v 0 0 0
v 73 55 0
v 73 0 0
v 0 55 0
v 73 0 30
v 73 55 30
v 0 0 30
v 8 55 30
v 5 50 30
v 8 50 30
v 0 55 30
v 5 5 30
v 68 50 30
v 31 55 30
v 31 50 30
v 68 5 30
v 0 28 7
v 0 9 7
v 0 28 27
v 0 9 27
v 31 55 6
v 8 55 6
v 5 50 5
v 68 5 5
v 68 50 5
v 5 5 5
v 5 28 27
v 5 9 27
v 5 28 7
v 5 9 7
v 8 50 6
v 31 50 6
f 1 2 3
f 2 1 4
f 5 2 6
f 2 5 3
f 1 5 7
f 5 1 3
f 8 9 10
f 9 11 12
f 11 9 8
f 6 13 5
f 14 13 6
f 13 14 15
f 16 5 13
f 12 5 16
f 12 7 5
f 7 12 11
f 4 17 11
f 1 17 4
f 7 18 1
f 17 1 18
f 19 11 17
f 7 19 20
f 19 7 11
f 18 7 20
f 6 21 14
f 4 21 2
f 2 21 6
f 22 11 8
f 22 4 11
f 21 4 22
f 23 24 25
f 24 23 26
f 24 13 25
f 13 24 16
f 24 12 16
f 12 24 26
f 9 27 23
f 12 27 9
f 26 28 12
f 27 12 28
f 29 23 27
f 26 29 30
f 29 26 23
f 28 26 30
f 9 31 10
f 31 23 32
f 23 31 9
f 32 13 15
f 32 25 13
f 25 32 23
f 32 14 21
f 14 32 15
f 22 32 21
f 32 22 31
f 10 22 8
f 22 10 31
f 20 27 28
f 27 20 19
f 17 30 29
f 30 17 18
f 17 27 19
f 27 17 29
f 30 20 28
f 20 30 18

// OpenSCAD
// file: variables.scad
// Support
supportThickness = 12;
supportHoleHeight = 80;
supportWidth = 80;
supportTaper = 20;
supportBaseDepth = 30;

// Support right
supportRightHoleRadius = 6;

// Camera mount
cameraMountGoproWidth = 63;
cameraMountGoproHeight = 45;
cameraMountGoproDepth = 25;

cameraMountThickness = 5;
cameraMountWidth = cameraMountGoproWidth + 2 * cameraMountThickness;
cameraMountHeight = cameraMountGoproHeight + 2 * cameraMountThickness;
cameraMountDepth = cameraMountGoproDepth + cameraMountThickness;

cameraMountShutterCutoutWidth = 13;
cameraMountShutterCutoutOffsetX = 8;
cameraMountShutterCutoutOffsetZ = 6;
cameraMountShutterCutoutGap = 5;

cameraMountPowerCutoutDepth = 10;
cameraMountPowerCutoutHeight = 9;
cameraMountPowerCutoutOffsetY = 9;
cameraMountPowerCutoutOffsetZ = 7;
cameraMountPowerCutoutGap = 5;
// main file
include <variables.scad>

// Camera mount
module cameraMount() {
    difference() {
        cameraMountCase();
        cameraMountShutterCutout();
        cameraMountPowerCutout();
    }
}

// Camera mount case
module cameraMountCase() {
    difference() {
        linear_extrude(height = cameraMountDepth)
        polygon(points = [[0, 0], [cameraMountWidth , 0], [cameraMountWidth, cameraMountHeight], [0, cameraMountHeight]]);

        translate([cameraMountThickness, cameraMountThickness, cameraMountThickness])
        linear_extrude(height = cameraMountGoproDepth)
        polygon(points = [[0, 0], [cameraMountGoproWidth , 0], [cameraMountGoproWidth, cameraMountGoproHeight], [0, cameraMountGoproHeight]]);
    }
}

// Cutout for shutter
module cameraMountShutterCutout() {
    translate([
        cameraMountThickness + cameraMountShutterCutoutOffsetX - cameraMountShutterCutoutGap,
        cameraMountHeight - cameraMountThickness,
        cameraMountThickness + cameraMountShutterCutoutOffsetZ - cameraMountShutterCutoutGap
    ])
    cube([
        cameraMountShutterCutoutWidth + 2 * cameraMountShutterCutoutGap,
        cameraMountThickness,
        cameraMountGoproDepth

    ]);
}

// Cutout for power button
module cameraMountPowerCutout() {
    translate([
        0,
        cameraMountPowerCutoutOffsetY + cameraMountThickness - cameraMountPowerCutoutGap,
        cameraMountPowerCutoutOffsetZ + cameraMountThickness - cameraMountPowerCutoutGap,
    ])
    cube([
        cameraMountThickness,
        cameraMountPowerCutoutHeight + 2 * cameraMountPowerCutoutGap,
        cameraMountPowerCutoutDepth + 2 * cameraMountPowerCutoutGap
    ]);
}

cameraMount();
